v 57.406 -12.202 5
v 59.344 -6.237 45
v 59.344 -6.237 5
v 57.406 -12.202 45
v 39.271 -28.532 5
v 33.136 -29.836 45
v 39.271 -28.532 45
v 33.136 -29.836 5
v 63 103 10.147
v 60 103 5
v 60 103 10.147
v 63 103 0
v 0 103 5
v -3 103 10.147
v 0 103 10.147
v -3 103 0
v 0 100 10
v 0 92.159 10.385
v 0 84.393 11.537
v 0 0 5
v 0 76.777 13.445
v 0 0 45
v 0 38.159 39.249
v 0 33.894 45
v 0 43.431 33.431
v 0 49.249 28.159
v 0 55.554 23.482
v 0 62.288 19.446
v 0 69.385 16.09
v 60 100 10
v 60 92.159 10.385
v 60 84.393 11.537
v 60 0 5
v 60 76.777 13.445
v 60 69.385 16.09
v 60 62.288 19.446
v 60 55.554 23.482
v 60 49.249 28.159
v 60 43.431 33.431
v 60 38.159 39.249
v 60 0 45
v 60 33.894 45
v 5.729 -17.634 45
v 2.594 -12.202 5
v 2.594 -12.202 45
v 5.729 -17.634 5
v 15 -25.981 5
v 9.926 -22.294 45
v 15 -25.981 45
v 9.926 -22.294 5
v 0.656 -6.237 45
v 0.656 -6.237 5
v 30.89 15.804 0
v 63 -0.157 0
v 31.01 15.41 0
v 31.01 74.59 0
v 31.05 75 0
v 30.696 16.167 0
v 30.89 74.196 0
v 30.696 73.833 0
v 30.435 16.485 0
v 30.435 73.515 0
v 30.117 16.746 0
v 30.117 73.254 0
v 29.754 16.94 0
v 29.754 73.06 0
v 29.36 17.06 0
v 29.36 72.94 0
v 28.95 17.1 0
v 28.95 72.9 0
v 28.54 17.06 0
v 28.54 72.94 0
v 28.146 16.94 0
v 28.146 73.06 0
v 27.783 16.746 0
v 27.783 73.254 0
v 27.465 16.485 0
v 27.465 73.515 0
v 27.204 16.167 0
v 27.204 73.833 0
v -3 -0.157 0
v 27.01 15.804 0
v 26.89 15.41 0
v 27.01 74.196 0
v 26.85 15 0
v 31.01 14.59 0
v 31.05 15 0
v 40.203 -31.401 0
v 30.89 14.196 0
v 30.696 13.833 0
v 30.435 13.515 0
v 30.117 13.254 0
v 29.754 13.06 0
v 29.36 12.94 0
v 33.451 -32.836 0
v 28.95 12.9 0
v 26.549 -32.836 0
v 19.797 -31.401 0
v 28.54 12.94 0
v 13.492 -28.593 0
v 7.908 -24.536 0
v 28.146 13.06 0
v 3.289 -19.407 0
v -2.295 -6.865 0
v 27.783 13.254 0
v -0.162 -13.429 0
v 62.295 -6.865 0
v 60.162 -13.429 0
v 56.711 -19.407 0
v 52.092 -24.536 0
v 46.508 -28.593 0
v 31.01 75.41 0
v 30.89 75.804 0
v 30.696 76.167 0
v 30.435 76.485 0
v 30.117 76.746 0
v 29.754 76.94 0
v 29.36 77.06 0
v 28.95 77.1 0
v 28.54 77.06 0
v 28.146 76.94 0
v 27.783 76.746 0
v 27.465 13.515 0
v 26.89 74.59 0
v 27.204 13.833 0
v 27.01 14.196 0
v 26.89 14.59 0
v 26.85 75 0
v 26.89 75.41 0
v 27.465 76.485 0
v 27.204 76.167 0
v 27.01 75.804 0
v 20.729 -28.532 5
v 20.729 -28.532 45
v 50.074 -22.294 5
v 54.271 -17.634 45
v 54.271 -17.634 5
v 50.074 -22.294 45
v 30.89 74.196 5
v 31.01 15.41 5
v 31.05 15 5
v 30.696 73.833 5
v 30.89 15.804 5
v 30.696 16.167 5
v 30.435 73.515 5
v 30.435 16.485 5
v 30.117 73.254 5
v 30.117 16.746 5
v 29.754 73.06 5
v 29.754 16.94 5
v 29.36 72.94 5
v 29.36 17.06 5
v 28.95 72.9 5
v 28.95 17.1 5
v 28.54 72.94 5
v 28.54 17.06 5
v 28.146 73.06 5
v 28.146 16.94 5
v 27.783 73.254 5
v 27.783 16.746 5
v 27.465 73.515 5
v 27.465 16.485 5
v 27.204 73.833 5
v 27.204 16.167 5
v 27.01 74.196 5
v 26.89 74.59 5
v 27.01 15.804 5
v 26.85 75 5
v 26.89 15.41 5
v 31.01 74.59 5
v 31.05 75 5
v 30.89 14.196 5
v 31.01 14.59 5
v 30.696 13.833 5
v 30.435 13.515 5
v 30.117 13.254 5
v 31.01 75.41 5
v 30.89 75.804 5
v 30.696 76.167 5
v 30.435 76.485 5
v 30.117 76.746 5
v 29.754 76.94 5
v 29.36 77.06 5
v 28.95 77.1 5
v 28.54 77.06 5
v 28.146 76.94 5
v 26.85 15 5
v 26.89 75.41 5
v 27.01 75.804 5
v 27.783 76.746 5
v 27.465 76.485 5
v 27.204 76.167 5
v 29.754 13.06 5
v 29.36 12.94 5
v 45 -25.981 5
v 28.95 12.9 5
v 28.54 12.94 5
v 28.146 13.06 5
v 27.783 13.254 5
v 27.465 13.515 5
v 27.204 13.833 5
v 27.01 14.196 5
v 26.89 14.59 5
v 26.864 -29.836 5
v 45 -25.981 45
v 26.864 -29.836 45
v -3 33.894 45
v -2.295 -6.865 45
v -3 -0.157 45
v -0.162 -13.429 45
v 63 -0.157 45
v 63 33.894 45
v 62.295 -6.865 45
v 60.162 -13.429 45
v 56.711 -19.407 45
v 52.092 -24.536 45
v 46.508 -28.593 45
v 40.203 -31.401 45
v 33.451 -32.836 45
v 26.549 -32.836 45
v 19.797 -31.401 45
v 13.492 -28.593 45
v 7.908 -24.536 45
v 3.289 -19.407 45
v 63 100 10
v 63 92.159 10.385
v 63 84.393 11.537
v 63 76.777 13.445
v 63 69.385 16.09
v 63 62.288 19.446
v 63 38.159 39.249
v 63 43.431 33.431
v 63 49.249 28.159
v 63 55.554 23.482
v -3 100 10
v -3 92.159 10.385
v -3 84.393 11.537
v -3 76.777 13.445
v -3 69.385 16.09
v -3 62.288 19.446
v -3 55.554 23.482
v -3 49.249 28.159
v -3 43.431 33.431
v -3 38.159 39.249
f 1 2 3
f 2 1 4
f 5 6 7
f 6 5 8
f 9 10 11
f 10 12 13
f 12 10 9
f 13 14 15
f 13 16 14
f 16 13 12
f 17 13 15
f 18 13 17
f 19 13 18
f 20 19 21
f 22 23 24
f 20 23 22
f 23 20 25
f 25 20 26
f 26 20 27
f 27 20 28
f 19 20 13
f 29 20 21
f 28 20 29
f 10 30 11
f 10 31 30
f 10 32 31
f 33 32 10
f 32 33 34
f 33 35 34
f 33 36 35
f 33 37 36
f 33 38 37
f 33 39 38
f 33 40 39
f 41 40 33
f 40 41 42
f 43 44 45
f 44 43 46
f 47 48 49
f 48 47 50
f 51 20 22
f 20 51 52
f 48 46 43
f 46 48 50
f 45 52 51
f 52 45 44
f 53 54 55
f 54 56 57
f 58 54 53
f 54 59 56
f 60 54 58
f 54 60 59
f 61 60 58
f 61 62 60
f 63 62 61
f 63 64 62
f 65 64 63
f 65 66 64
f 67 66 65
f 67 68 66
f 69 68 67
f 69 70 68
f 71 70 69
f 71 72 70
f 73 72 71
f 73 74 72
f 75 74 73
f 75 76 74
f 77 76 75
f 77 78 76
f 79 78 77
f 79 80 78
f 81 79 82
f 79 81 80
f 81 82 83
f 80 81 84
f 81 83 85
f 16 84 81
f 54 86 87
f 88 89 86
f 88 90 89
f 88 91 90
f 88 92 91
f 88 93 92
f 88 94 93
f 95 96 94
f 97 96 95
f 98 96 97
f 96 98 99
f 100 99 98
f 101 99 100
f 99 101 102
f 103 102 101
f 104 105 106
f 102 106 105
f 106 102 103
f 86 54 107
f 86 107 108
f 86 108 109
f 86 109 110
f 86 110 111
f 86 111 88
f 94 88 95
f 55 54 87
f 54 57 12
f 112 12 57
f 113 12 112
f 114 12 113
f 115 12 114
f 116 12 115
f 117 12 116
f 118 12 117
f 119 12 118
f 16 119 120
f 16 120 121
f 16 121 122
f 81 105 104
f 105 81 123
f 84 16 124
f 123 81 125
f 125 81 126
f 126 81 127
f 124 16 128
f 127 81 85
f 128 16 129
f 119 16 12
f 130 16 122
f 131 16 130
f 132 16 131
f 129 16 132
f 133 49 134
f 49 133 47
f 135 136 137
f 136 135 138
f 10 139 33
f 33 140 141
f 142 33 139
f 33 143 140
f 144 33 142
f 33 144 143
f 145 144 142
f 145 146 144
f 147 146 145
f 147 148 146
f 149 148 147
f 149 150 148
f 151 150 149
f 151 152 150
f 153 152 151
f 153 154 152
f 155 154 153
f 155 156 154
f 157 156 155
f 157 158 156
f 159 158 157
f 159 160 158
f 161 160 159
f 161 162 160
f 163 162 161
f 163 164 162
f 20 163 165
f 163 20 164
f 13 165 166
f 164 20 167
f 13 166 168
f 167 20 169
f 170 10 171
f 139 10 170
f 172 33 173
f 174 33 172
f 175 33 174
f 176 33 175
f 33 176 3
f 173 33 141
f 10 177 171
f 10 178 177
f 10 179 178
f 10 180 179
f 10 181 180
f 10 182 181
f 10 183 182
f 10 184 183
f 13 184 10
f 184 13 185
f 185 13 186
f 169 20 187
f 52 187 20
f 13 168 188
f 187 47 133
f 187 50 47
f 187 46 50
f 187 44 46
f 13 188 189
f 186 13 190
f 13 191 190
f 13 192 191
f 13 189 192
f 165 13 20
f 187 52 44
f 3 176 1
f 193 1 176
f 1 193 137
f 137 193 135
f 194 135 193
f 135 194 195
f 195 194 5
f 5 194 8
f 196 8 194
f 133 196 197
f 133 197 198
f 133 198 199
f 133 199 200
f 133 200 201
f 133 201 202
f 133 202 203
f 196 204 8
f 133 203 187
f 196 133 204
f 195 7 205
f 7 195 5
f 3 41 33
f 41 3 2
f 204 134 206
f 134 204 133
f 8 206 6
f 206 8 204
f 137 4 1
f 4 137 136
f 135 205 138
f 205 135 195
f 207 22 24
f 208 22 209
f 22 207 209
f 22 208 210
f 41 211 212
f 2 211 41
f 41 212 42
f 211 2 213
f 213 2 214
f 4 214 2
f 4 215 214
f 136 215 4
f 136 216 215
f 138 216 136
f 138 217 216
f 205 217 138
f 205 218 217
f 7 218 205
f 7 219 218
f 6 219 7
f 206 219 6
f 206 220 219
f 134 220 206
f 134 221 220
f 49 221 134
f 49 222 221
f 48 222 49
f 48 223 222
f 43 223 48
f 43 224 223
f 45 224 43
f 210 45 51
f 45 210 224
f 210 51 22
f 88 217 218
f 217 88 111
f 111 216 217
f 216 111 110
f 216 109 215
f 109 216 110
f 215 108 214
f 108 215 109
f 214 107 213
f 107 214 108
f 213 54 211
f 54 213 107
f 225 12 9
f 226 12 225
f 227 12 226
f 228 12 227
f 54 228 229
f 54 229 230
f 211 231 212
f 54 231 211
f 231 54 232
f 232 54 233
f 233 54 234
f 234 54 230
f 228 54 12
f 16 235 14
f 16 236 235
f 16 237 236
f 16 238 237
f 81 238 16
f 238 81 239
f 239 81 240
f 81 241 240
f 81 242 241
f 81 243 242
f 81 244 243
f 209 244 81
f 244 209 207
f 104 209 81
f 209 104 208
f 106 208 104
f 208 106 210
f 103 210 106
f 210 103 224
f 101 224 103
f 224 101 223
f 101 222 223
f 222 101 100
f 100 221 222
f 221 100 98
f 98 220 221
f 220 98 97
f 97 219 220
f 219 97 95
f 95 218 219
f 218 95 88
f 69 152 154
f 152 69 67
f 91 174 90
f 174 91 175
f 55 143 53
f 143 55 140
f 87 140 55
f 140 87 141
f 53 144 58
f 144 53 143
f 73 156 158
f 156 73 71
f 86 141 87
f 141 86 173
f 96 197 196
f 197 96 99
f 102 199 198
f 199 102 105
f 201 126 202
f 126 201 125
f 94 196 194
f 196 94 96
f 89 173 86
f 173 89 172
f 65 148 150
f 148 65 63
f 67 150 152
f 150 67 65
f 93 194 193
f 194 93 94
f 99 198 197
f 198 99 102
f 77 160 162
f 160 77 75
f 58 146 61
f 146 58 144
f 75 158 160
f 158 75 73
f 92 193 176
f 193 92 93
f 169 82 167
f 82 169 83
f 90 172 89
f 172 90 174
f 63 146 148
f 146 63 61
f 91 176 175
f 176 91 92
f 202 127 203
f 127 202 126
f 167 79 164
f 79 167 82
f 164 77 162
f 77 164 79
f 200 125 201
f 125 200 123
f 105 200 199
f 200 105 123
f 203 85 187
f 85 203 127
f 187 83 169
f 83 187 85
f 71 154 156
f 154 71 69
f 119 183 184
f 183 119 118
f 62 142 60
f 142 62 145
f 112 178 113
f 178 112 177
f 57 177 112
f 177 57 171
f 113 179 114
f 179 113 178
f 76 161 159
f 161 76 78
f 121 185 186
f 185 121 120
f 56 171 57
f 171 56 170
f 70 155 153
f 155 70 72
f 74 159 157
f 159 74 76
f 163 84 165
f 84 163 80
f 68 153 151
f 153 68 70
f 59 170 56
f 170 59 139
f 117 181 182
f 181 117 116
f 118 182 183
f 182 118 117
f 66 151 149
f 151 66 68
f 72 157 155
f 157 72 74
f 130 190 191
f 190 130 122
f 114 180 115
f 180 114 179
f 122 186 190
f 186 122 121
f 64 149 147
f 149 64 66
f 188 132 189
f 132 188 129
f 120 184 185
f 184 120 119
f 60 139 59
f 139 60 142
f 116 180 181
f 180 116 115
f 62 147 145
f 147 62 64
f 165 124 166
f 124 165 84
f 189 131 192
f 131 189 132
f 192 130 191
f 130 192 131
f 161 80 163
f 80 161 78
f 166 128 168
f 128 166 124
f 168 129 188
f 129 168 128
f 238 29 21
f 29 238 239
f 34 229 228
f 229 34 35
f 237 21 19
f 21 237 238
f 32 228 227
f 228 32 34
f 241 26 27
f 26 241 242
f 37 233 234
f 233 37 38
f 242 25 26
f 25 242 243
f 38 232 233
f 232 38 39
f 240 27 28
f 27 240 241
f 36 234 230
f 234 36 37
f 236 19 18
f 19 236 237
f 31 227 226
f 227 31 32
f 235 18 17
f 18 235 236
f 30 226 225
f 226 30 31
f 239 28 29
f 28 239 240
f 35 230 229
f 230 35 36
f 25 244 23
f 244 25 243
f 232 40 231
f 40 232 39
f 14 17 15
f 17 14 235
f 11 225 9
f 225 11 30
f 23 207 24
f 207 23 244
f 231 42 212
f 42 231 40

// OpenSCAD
hole_distance = 60;
height = 100;
width = 60;
wall_thickness = 3;
base_thinkess = 5;
length = 40;
hole_radius = 2;
tolerance = 0.2;
module base(off, addon = 0) {
    offset(delta=off) {
        translate([width/2, 0 ,0]) circle(r=width/2);
        square([width, height + addon], false);
    }
}
cutout_r = hole_radius + tolerance/2;

difference() {
    difference() {
        union() {
            linear_extrude(base_thinkess) base(0, wall_thickness);
            linear_extrude(length+base_thinkess) {
                difference() {
                    base(wall_thickness);
                    base(0, wall_thickness);
                }
            }
        }

        translate([width/2 - cutout_r/2, 15, 0]) cylinder(r=cutout_r, h=10, $fn=32);
        translate([width/2 - cutout_r/2, 15 + 60, 0]) cylinder(r=cutout_r, h=10, $fn=32);
    }

    #translate([-width/2, length * 2.5 ,width*1.5]) rotate([90, 0 ,90]) cylinder(r=length * 2, h=width * 2, $fn = 64);
}
